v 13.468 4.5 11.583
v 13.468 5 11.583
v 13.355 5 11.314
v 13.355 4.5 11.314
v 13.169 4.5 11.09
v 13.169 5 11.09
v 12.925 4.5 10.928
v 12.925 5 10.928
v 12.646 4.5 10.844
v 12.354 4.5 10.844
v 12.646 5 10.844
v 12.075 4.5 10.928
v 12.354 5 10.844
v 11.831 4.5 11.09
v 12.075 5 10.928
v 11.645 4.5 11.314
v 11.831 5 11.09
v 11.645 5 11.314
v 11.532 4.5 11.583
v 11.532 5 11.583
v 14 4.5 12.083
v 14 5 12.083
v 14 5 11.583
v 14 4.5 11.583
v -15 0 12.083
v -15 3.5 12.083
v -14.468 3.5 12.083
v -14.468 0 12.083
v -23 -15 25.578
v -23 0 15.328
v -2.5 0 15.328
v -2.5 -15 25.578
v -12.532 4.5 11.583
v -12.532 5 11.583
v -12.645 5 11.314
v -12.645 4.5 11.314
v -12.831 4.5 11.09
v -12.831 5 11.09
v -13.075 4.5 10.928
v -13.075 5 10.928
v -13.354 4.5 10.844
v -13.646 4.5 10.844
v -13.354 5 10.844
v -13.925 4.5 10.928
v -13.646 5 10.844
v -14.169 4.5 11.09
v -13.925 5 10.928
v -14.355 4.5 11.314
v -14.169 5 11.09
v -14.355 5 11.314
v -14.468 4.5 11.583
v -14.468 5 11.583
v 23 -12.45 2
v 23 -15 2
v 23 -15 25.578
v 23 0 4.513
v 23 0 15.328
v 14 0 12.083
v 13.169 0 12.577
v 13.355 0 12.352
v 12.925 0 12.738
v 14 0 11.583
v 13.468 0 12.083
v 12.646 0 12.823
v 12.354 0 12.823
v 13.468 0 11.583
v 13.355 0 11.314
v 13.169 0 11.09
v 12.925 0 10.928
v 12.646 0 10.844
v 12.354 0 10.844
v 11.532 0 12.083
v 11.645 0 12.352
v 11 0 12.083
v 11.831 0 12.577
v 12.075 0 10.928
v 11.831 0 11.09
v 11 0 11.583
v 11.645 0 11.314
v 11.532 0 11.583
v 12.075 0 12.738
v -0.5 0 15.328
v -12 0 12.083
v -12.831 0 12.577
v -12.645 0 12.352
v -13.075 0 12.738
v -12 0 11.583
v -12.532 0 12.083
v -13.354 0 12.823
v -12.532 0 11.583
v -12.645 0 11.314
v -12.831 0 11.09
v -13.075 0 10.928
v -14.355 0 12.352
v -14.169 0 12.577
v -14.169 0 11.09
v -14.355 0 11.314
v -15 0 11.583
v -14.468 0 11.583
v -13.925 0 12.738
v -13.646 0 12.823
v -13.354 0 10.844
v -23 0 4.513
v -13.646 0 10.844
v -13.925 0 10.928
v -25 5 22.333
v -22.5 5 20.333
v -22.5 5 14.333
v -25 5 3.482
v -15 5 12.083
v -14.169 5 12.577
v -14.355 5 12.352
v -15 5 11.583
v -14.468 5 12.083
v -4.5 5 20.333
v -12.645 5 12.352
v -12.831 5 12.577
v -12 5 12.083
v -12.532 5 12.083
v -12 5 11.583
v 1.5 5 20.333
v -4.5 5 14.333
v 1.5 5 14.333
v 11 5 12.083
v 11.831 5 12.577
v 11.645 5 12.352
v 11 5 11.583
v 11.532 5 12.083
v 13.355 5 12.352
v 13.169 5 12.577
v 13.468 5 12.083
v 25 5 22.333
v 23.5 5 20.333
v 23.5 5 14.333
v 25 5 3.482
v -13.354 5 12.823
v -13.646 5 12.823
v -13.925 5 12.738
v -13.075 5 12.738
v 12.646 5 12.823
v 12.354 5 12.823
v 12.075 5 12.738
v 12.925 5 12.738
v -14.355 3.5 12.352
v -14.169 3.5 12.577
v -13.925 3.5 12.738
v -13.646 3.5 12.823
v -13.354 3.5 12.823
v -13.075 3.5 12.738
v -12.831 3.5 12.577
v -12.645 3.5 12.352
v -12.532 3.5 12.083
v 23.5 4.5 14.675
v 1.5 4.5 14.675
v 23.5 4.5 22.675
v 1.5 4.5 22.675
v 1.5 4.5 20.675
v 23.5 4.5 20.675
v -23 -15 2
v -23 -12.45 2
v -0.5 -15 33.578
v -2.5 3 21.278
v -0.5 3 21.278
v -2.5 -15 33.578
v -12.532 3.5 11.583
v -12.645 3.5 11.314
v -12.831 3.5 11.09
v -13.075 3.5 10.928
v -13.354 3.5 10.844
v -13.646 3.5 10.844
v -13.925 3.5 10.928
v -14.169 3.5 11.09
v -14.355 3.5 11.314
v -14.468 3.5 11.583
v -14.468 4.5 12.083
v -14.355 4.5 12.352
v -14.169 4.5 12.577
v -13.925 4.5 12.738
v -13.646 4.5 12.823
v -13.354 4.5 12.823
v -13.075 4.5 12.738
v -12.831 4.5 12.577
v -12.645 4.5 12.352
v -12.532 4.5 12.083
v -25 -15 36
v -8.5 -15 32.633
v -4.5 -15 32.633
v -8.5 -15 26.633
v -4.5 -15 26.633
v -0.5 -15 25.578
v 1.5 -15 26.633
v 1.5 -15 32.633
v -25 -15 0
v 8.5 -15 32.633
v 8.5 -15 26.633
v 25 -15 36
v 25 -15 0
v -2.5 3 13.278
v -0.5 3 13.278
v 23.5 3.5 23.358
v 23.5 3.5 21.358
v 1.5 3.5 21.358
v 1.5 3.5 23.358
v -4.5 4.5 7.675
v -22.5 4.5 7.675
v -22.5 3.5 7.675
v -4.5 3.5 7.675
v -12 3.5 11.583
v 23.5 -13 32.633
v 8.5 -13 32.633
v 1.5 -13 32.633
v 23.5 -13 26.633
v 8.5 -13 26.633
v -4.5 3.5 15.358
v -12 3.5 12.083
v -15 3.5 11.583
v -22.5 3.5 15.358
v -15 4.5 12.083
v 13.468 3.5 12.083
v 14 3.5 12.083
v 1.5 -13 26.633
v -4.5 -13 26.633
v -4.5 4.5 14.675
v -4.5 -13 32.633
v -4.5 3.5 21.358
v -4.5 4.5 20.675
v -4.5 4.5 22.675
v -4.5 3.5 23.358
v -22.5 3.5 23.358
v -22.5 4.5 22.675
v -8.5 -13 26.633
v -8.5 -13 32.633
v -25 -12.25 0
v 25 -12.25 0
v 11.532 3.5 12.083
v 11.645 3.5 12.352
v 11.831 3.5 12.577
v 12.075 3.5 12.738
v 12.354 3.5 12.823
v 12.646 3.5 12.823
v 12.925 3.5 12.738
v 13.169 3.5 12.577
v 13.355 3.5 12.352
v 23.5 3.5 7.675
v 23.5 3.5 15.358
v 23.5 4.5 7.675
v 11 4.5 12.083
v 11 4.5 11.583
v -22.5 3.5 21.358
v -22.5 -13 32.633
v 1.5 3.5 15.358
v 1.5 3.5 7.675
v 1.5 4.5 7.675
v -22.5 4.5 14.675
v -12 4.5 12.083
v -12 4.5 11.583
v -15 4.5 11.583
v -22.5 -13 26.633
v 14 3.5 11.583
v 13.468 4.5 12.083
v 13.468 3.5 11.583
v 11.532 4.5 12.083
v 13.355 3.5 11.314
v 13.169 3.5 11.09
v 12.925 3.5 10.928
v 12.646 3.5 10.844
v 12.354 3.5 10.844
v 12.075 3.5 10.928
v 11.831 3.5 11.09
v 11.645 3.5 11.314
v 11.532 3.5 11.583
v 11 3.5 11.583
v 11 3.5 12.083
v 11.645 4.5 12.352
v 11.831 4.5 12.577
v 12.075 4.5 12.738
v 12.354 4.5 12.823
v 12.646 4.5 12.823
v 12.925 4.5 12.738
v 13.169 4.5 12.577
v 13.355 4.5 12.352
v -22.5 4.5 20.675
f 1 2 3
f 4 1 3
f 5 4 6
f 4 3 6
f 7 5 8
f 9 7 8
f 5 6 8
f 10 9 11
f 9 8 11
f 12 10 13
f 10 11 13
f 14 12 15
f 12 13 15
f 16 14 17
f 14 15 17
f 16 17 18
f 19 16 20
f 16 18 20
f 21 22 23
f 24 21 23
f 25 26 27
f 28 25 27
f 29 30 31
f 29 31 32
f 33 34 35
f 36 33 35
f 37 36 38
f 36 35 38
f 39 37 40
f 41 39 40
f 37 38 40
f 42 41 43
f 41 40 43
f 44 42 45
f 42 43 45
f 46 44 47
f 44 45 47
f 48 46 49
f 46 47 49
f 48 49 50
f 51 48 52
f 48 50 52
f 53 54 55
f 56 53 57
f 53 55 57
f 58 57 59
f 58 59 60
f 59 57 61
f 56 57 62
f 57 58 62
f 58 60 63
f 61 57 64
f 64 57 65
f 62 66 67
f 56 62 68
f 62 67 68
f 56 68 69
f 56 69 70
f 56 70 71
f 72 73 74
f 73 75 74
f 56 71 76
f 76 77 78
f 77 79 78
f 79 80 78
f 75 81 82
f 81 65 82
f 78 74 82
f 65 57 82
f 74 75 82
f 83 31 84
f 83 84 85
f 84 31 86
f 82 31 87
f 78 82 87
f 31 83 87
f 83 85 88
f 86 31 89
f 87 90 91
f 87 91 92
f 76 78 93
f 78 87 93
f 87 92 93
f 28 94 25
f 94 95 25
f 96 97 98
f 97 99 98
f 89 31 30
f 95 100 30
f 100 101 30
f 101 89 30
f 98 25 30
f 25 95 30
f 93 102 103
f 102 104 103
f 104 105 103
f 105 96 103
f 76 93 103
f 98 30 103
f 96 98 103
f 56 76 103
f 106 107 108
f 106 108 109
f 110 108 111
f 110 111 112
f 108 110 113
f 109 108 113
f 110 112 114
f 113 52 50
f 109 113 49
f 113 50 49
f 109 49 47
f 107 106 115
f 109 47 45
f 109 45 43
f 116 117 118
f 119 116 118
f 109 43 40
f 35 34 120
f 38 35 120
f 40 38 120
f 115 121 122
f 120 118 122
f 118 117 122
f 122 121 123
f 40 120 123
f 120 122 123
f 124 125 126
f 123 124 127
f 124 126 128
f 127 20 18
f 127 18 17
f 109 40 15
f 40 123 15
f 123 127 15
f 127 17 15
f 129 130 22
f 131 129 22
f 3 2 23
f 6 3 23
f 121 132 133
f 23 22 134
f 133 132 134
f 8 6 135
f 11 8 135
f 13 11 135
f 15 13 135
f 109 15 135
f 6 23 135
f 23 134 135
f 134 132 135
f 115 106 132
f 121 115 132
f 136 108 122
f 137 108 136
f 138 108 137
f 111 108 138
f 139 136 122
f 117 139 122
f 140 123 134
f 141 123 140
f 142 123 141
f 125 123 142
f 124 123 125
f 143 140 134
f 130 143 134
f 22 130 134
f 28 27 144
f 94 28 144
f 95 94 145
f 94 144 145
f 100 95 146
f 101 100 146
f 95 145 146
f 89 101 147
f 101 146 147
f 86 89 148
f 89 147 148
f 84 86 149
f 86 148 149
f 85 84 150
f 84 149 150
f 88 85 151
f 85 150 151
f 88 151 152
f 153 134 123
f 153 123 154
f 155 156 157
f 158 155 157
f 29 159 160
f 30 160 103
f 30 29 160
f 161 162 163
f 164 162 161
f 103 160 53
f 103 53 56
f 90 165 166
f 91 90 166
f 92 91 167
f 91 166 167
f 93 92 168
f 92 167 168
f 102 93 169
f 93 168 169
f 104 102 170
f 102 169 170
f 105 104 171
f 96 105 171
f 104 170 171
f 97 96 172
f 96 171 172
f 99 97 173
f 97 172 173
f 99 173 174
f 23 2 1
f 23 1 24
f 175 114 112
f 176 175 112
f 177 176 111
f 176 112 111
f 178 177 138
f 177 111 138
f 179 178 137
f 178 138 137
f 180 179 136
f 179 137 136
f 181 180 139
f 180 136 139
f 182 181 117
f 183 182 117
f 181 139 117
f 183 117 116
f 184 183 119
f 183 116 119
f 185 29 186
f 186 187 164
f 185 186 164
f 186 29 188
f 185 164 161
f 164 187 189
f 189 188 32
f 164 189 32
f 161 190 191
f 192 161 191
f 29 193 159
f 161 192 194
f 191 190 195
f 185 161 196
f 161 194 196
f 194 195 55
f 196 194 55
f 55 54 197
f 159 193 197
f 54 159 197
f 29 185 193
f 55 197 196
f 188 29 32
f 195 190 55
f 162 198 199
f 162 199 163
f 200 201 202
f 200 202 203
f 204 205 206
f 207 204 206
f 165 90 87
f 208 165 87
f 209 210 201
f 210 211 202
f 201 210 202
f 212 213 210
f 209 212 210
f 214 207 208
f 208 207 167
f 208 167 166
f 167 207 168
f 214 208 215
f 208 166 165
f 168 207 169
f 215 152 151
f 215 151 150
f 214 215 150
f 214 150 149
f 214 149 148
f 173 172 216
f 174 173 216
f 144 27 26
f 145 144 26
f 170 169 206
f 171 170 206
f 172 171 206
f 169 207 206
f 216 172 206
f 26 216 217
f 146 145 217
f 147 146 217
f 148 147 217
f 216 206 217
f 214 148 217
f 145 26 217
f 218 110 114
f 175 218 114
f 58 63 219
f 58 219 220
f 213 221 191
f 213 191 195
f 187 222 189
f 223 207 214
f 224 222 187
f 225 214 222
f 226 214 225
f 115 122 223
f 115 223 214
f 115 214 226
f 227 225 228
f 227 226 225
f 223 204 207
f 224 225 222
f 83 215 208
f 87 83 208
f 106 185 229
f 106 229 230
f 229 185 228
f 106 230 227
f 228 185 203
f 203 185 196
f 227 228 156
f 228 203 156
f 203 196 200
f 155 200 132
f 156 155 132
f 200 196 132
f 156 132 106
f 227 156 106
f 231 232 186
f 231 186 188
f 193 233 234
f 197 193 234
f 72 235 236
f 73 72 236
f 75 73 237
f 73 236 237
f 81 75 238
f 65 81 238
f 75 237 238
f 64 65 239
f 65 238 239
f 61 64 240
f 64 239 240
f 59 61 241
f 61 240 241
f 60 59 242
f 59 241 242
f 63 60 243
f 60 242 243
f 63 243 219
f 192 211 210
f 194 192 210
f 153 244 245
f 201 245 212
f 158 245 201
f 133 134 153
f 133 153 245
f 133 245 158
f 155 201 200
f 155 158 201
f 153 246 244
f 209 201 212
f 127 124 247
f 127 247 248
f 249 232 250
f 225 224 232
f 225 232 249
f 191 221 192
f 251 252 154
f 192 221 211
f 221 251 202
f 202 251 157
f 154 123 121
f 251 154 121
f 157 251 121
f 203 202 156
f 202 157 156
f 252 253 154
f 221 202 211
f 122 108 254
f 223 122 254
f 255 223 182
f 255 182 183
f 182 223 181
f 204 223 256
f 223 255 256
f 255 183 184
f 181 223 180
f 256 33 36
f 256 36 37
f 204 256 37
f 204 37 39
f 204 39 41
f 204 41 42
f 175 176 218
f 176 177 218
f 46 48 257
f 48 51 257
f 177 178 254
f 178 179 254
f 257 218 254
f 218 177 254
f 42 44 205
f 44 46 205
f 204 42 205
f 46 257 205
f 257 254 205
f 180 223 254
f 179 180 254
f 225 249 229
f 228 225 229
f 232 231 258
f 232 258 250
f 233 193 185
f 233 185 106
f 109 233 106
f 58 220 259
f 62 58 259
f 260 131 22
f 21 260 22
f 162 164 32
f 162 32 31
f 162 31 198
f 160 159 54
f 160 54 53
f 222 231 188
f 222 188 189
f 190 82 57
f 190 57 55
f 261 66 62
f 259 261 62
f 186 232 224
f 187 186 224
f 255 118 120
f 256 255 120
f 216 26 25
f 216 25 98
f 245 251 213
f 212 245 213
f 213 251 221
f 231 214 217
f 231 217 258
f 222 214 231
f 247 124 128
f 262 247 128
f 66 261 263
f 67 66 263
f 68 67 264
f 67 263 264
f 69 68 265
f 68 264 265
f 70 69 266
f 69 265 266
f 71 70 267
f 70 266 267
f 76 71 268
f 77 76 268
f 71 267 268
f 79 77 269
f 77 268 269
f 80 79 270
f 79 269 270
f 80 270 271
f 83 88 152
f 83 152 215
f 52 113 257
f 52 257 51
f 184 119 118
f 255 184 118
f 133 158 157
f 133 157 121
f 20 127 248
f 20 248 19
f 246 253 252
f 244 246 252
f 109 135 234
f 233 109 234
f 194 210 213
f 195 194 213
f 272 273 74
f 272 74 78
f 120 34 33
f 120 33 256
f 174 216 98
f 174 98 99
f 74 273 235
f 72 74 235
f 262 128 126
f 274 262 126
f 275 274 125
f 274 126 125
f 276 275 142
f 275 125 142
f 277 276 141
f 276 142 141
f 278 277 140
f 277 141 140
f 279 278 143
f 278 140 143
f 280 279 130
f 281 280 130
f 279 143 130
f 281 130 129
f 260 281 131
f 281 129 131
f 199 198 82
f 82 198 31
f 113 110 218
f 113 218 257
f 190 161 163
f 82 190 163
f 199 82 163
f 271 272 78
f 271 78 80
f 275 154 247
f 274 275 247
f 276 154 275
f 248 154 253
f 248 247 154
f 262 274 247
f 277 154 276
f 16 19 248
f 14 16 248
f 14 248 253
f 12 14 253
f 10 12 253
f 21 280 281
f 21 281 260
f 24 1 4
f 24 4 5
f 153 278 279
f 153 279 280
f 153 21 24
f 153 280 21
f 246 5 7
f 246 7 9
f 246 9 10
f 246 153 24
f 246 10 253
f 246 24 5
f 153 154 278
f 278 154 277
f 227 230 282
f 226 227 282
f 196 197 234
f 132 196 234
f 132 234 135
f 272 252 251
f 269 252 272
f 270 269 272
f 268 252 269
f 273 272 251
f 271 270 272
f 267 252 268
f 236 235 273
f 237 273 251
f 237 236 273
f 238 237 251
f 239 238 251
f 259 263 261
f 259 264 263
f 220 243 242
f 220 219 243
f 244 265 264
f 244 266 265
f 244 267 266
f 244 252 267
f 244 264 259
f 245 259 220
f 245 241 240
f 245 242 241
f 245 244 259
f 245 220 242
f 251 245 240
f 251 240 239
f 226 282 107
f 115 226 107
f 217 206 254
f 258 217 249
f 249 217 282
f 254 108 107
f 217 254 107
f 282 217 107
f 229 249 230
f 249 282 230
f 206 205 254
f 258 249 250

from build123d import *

# Parameters (mm, degrees)
SKIZZE1_W                            = 50
SKIZZE1_H                            = 30
AUFSATZ_LINEAR_AUSTRAGEN1_DEPTH      = 40
FPV_SENDER_START                     = -1.5
FPV_SENDER_DEPTH                     = 22
EMPF_NGER_START                      = 4.5
EMPF_NGER_DEPTH                      = 18
SCHNITT_LINEAR_AUSTRAGEN3_DEPTH      = 66.76473219
SCHNITT_LINEAR_AUSTRAGEN3_DEPTH_BACK = 66.76473219
SCHNITT_LINEAR_AUSTRAGEN5_REACH      = 65.411
WANDUNG2_START                       = -23
WANDUNG2_DEPTH                       = 46
WANDUNG2_START_2                     = -2.5
WANDUNG2_2_DEPTH                     = 2
SKIZZE6_W                            = 7
SKIZZE6_H                            = 6
SCHNITT_LINEAR_AUSTRAGEN4_DEPTH      = 2
SKIZZE8_W                            = 4
SKIZZE8_H                            = 6
SCHNITT_LINEAR_AUSTRAGEN7_DEPTH      = 2
SCHNITT_LINEAR_START                 = -2.5
SCHNITT_LINEAR_AUSTRAGEN8_DEPTH      = 18
SCHNITT_LINEAR_START_2               = -1.5
SCHNITT_LINEAR_AUSTRAGEN9_DEPTH      = 22
AUFSATZ_LINEAR_AUSTRAGEN2_REACH      = 63.847
SCHNITT_LINEAR_AUSTRAGEN10_REACH     = 50.177
SKIZZE11_R                           = 1
SKIZZE11_W                           = 3
SKIZZE11_H                           = 0.5


# Read off the part's stored shape, not the designer's step: Wandung2
with BuildPart() as part:
    # Skizze1 → Aufsatz-Linear austragen1 (new body)
    with BuildSketch(Plane.XY):
        Rectangle(SKIZZE1_W, SKIZZE1_H)
    extrude(amount=AUFSATZ_LINEAR_AUSTRAGEN1_DEPTH)

    # Skizze2 → FPV_Sender (cut)
    with BuildSketch(Plane.ZY.offset(FPV_SENDER_START)):
        Polygon((13.5, 15), (7.5, 15), (26.633333333, -13), (32.633333333, -13), align=None)
    extrude(amount=-FPV_SENDER_DEPTH, mode=Mode.SUBTRACT)

    # Skizze4 → Empfänger (cut)
    with BuildSketch(Plane.ZY.offset(EMPF_NGER_START)):
        Polygon((13.5, 15), (7.5, 15), (26.633333333, -13), (32.633333333, -13), align=None)
    extrude(amount=EMPF_NGER_DEPTH, mode=Mode.SUBTRACT)

    # Skizze5 → Schnitt-Linear austragen3 (cut, two sides: drawn at the far end of the back side and taken through both)
    with BuildSketch(Plane.ZY.offset(25).offset(-SCHNITT_LINEAR_AUSTRAGEN3_DEPTH_BACK)):
        Polygon((15.5, 15), (40, 15), (40, -20.853658537), align=None)
        Polygon((5.5, 15), (0, -12.25), (0, 15), align=None)
    extrude(amount=SCHNITT_LINEAR_AUSTRAGEN3_DEPTH + SCHNITT_LINEAR_AUSTRAGEN3_DEPTH_BACK, mode=Mode.SUBTRACT)

    # Schnitt-Linear austragen5: up to this face of the body (flat: up to its plane)
    schnitt_linear_austragen5_end = Plane(part.part.faces().sort_by_distance((-25, -2.83971717, 14.814249022))[0])
    # Skizze7 → Schnitt-Linear austragen5 (cut, up to the picked face)
    with BuildSketch(Plane(origin=(25, 0, 0), x_dir=(0, 0, -1), z_dir=(1, 0, 0)), mode=Mode.PRIVATE) as schnitt_linear_austragen5_sk1:
        Polygon((-5.5, 15), (-15.5, 15), (-22.333333333, 5), (-3.481651376, 5), align=None)
    schnitt_linear_austragen5_tool1 = split(extrude(schnitt_linear_austragen5_sk1.sketch, amount=-SCHNITT_LINEAR_AUSTRAGEN5_REACH, mode=Mode.PRIVATE), bisect_by=schnitt_linear_austragen5_end, keep=Keep.BOTH, mode=Mode.PRIVATE)
    add(schnitt_linear_austragen5_tool1.solids().sort_by(Axis((25, 9.488667, 11.826849), (-1, 0, 0)))[0], mode=Mode.SUBTRACT)

    # Wandung2 outline → Wandung2 (cut)
    with BuildSketch(Plane.YZ.offset(WANDUNG2_START)):
        Polygon((3, 13.27765036), (-15, 25.57765036), (-15, 2), (-12.449820142, 2), (3, 5.118312322), align=None)
    extrude(amount=WANDUNG2_DEPTH, mode=Mode.SUBTRACT)

    # Wandung2 2 outline → Wandung2 2 (cut)
    with BuildSketch(Plane.YZ.offset(WANDUNG2_START_2)):
        Polygon((-15, 33.57765036), (-15, 25.57765036), (3, 13.27765036), (3, 21.27765036), align=None)
    extrude(amount=WANDUNG2_2_DEPTH, mode=Mode.SUBTRACT)

    # Skizze6 → Schnitt-Linear austragen4 (cut)
    with BuildSketch(Plane(origin=(0, -13, 0), x_dir=(1, 0, 0), z_dir=(0, 1, 0))):
        with Locations((5, -29.633333333)):
            Rectangle(SKIZZE6_W, SKIZZE6_H)
    extrude(amount=-SCHNITT_LINEAR_AUSTRAGEN4_DEPTH, mode=Mode.SUBTRACT)

    # Skizze8 → Schnitt-Linear austragen7 (cut)
    with BuildSketch(Plane(origin=(0, -13, 0), x_dir=(1, 0, 0), z_dir=(0, 1, 0))):
        with Locations((-6.5, -29.633333333)):
            Rectangle(SKIZZE8_W, SKIZZE8_H)
    extrude(amount=-SCHNITT_LINEAR_AUSTRAGEN7_DEPTH, mode=Mode.SUBTRACT)

    # Skizze9 → Schnitt-Linear austragen8 (cut)
    with BuildSketch(Plane.ZY.offset(25).offset(SCHNITT_LINEAR_START)):
        Polygon((22.675, 4.5), (7.675, 4.5), (7.675, 3.5), (23.358333333, 3.5), align=None)
    extrude(amount=-SCHNITT_LINEAR_AUSTRAGEN8_DEPTH, mode=Mode.SUBTRACT)

    # Skizze10 → Schnitt-Linear austragen9 (cut)
    with BuildSketch(Plane(origin=(25, 0, 0), x_dir=(0, 0, -1), z_dir=(1, 0, 0)).offset(SCHNITT_LINEAR_START_2)):
        Polygon((-22.675, 4.5), (-7.675, 4.5), (-7.675, 3.5), (-23.358333333, 3.5), align=None)
    extrude(amount=-SCHNITT_LINEAR_AUSTRAGEN9_DEPTH, mode=Mode.SUBTRACT)

    # Aufsatz-Linear austragen2: up to this face of the body (flat: up to its plane)
    aufsatz_linear_austragen2_end = Plane(part.part.faces().sort_by_distance((23, -7.466953152, 11.743949806))[0])
    # Skizze12 → Aufsatz-Linear austragen2 (add, up to the picked face)
    with BuildSketch(Plane(origin=(-23, 0, 0), x_dir=(0, 0, -1), z_dir=(1, 0, 0)), mode=Mode.PRIVATE) as aufsatz_linear_austragen2_sk1:
        Polygon((-5.118312322, 3), (-13.27765036, 3), (-15.32765036, 0), (-4.512807735, 0), align=None)
    aufsatz_linear_austragen2_tool1 = split(extrude(aufsatz_linear_austragen2_sk1.sketch, amount=AUFSATZ_LINEAR_AUSTRAGEN2_REACH, mode=Mode.PRIVATE), bisect_by=aufsatz_linear_austragen2_end, keep=Keep.BOTH, mode=Mode.PRIVATE)
    add(aufsatz_linear_austragen2_tool1.solids().sort_by(Axis((-23, 1.430023, 9.575952), (1, 0, 0)))[0])

    # Schnitt-Linear austragen10: up to this face of the body (flat: up to its plane)
    schnitt_linear_austragen10_end = Plane(part.part.faces().sort_by_distance((0, 0, 9.920229048))[0])
    # Skizze11 → Schnitt-Linear austragen10 (cut, up to the picked face)
    with BuildSketch(Plane(origin=(0, 5, 0), x_dir=(1, 0, 0), z_dir=(0, 1, 0)), mode=Mode.PRIVATE) as schnitt_linear_austragen10_sk1:
        with Locations((12.5, -11.833333333)):
            Circle(SKIZZE11_R)
    schnitt_linear_austragen10_tool1 = split(extrude(schnitt_linear_austragen10_sk1.sketch, amount=-SCHNITT_LINEAR_AUSTRAGEN10_REACH, mode=Mode.PRIVATE), bisect_by=schnitt_linear_austragen10_end, keep=Keep.BOTH, mode=Mode.PRIVATE)
    # Skizze11 → Schnitt-Linear austragen10 (cut, up to the picked face)
    with BuildSketch(Plane(origin=(0, 5, 0), x_dir=(1, 0, 0), z_dir=(0, 1, 0)), mode=Mode.PRIVATE) as schnitt_linear_austragen10_sk2:
        with Locations((-13.5, -11.833333333)):
            Circle(SKIZZE11_R)
    schnitt_linear_austragen10_tool2 = split(extrude(schnitt_linear_austragen10_sk2.sketch, amount=-SCHNITT_LINEAR_AUSTRAGEN10_REACH, mode=Mode.PRIVATE), bisect_by=schnitt_linear_austragen10_end, keep=Keep.BOTH, mode=Mode.PRIVATE)
    # Skizze11 → Schnitt-Linear austragen10 (cut, up to the picked face)
    with BuildSketch(Plane(origin=(0, 5, 0), x_dir=(1, 0, 0), z_dir=(0, 1, 0)), mode=Mode.PRIVATE) as schnitt_linear_austragen10_sk3:
        with Locations((12.5, -11.833333333)):
            Rectangle(SKIZZE11_W, SKIZZE11_H)
    schnitt_linear_austragen10_tool3 = split(extrude(schnitt_linear_austragen10_sk3.sketch, amount=-SCHNITT_LINEAR_AUSTRAGEN10_REACH, mode=Mode.PRIVATE), bisect_by=schnitt_linear_austragen10_end, keep=Keep.BOTH, mode=Mode.PRIVATE)
    # Skizze11 → Schnitt-Linear austragen10 (cut, up to the picked face)
    with BuildSketch(Plane(origin=(0, 5, 0), x_dir=(1, 0, 0), z_dir=(0, 1, 0)), mode=Mode.PRIVATE) as schnitt_linear_austragen10_sk4:
        with Locations((-13.5, -11.833333333)):
            Rectangle(SKIZZE11_W, SKIZZE11_H)
    schnitt_linear_austragen10_tool4 = split(extrude(schnitt_linear_austragen10_sk4.sketch, amount=-SCHNITT_LINEAR_AUSTRAGEN10_REACH, mode=Mode.PRIVATE), bisect_by=schnitt_linear_austragen10_end, keep=Keep.BOTH, mode=Mode.PRIVATE)
    add(schnitt_linear_austragen10_tool1.solids().sort_by(Axis((12.5, 5, 11.833333), (0, -1, 0)))[0], mode=Mode.SUBTRACT)
    add(schnitt_linear_austragen10_tool2.solids().sort_by(Axis((-13.5, 5, 11.833333), (0, -1, 0)))[0], mode=Mode.SUBTRACT)
    add(schnitt_linear_austragen10_tool3.solids().sort_by(Axis((12.5, 5, 11.833333), (0, -1, 0)))[0], mode=Mode.SUBTRACT)
    add(schnitt_linear_austragen10_tool4.solids().sort_by(Axis((-13.5, 5, 11.833333), (0, -1, 0)))[0], mode=Mode.SUBTRACT)


solid = part.part
